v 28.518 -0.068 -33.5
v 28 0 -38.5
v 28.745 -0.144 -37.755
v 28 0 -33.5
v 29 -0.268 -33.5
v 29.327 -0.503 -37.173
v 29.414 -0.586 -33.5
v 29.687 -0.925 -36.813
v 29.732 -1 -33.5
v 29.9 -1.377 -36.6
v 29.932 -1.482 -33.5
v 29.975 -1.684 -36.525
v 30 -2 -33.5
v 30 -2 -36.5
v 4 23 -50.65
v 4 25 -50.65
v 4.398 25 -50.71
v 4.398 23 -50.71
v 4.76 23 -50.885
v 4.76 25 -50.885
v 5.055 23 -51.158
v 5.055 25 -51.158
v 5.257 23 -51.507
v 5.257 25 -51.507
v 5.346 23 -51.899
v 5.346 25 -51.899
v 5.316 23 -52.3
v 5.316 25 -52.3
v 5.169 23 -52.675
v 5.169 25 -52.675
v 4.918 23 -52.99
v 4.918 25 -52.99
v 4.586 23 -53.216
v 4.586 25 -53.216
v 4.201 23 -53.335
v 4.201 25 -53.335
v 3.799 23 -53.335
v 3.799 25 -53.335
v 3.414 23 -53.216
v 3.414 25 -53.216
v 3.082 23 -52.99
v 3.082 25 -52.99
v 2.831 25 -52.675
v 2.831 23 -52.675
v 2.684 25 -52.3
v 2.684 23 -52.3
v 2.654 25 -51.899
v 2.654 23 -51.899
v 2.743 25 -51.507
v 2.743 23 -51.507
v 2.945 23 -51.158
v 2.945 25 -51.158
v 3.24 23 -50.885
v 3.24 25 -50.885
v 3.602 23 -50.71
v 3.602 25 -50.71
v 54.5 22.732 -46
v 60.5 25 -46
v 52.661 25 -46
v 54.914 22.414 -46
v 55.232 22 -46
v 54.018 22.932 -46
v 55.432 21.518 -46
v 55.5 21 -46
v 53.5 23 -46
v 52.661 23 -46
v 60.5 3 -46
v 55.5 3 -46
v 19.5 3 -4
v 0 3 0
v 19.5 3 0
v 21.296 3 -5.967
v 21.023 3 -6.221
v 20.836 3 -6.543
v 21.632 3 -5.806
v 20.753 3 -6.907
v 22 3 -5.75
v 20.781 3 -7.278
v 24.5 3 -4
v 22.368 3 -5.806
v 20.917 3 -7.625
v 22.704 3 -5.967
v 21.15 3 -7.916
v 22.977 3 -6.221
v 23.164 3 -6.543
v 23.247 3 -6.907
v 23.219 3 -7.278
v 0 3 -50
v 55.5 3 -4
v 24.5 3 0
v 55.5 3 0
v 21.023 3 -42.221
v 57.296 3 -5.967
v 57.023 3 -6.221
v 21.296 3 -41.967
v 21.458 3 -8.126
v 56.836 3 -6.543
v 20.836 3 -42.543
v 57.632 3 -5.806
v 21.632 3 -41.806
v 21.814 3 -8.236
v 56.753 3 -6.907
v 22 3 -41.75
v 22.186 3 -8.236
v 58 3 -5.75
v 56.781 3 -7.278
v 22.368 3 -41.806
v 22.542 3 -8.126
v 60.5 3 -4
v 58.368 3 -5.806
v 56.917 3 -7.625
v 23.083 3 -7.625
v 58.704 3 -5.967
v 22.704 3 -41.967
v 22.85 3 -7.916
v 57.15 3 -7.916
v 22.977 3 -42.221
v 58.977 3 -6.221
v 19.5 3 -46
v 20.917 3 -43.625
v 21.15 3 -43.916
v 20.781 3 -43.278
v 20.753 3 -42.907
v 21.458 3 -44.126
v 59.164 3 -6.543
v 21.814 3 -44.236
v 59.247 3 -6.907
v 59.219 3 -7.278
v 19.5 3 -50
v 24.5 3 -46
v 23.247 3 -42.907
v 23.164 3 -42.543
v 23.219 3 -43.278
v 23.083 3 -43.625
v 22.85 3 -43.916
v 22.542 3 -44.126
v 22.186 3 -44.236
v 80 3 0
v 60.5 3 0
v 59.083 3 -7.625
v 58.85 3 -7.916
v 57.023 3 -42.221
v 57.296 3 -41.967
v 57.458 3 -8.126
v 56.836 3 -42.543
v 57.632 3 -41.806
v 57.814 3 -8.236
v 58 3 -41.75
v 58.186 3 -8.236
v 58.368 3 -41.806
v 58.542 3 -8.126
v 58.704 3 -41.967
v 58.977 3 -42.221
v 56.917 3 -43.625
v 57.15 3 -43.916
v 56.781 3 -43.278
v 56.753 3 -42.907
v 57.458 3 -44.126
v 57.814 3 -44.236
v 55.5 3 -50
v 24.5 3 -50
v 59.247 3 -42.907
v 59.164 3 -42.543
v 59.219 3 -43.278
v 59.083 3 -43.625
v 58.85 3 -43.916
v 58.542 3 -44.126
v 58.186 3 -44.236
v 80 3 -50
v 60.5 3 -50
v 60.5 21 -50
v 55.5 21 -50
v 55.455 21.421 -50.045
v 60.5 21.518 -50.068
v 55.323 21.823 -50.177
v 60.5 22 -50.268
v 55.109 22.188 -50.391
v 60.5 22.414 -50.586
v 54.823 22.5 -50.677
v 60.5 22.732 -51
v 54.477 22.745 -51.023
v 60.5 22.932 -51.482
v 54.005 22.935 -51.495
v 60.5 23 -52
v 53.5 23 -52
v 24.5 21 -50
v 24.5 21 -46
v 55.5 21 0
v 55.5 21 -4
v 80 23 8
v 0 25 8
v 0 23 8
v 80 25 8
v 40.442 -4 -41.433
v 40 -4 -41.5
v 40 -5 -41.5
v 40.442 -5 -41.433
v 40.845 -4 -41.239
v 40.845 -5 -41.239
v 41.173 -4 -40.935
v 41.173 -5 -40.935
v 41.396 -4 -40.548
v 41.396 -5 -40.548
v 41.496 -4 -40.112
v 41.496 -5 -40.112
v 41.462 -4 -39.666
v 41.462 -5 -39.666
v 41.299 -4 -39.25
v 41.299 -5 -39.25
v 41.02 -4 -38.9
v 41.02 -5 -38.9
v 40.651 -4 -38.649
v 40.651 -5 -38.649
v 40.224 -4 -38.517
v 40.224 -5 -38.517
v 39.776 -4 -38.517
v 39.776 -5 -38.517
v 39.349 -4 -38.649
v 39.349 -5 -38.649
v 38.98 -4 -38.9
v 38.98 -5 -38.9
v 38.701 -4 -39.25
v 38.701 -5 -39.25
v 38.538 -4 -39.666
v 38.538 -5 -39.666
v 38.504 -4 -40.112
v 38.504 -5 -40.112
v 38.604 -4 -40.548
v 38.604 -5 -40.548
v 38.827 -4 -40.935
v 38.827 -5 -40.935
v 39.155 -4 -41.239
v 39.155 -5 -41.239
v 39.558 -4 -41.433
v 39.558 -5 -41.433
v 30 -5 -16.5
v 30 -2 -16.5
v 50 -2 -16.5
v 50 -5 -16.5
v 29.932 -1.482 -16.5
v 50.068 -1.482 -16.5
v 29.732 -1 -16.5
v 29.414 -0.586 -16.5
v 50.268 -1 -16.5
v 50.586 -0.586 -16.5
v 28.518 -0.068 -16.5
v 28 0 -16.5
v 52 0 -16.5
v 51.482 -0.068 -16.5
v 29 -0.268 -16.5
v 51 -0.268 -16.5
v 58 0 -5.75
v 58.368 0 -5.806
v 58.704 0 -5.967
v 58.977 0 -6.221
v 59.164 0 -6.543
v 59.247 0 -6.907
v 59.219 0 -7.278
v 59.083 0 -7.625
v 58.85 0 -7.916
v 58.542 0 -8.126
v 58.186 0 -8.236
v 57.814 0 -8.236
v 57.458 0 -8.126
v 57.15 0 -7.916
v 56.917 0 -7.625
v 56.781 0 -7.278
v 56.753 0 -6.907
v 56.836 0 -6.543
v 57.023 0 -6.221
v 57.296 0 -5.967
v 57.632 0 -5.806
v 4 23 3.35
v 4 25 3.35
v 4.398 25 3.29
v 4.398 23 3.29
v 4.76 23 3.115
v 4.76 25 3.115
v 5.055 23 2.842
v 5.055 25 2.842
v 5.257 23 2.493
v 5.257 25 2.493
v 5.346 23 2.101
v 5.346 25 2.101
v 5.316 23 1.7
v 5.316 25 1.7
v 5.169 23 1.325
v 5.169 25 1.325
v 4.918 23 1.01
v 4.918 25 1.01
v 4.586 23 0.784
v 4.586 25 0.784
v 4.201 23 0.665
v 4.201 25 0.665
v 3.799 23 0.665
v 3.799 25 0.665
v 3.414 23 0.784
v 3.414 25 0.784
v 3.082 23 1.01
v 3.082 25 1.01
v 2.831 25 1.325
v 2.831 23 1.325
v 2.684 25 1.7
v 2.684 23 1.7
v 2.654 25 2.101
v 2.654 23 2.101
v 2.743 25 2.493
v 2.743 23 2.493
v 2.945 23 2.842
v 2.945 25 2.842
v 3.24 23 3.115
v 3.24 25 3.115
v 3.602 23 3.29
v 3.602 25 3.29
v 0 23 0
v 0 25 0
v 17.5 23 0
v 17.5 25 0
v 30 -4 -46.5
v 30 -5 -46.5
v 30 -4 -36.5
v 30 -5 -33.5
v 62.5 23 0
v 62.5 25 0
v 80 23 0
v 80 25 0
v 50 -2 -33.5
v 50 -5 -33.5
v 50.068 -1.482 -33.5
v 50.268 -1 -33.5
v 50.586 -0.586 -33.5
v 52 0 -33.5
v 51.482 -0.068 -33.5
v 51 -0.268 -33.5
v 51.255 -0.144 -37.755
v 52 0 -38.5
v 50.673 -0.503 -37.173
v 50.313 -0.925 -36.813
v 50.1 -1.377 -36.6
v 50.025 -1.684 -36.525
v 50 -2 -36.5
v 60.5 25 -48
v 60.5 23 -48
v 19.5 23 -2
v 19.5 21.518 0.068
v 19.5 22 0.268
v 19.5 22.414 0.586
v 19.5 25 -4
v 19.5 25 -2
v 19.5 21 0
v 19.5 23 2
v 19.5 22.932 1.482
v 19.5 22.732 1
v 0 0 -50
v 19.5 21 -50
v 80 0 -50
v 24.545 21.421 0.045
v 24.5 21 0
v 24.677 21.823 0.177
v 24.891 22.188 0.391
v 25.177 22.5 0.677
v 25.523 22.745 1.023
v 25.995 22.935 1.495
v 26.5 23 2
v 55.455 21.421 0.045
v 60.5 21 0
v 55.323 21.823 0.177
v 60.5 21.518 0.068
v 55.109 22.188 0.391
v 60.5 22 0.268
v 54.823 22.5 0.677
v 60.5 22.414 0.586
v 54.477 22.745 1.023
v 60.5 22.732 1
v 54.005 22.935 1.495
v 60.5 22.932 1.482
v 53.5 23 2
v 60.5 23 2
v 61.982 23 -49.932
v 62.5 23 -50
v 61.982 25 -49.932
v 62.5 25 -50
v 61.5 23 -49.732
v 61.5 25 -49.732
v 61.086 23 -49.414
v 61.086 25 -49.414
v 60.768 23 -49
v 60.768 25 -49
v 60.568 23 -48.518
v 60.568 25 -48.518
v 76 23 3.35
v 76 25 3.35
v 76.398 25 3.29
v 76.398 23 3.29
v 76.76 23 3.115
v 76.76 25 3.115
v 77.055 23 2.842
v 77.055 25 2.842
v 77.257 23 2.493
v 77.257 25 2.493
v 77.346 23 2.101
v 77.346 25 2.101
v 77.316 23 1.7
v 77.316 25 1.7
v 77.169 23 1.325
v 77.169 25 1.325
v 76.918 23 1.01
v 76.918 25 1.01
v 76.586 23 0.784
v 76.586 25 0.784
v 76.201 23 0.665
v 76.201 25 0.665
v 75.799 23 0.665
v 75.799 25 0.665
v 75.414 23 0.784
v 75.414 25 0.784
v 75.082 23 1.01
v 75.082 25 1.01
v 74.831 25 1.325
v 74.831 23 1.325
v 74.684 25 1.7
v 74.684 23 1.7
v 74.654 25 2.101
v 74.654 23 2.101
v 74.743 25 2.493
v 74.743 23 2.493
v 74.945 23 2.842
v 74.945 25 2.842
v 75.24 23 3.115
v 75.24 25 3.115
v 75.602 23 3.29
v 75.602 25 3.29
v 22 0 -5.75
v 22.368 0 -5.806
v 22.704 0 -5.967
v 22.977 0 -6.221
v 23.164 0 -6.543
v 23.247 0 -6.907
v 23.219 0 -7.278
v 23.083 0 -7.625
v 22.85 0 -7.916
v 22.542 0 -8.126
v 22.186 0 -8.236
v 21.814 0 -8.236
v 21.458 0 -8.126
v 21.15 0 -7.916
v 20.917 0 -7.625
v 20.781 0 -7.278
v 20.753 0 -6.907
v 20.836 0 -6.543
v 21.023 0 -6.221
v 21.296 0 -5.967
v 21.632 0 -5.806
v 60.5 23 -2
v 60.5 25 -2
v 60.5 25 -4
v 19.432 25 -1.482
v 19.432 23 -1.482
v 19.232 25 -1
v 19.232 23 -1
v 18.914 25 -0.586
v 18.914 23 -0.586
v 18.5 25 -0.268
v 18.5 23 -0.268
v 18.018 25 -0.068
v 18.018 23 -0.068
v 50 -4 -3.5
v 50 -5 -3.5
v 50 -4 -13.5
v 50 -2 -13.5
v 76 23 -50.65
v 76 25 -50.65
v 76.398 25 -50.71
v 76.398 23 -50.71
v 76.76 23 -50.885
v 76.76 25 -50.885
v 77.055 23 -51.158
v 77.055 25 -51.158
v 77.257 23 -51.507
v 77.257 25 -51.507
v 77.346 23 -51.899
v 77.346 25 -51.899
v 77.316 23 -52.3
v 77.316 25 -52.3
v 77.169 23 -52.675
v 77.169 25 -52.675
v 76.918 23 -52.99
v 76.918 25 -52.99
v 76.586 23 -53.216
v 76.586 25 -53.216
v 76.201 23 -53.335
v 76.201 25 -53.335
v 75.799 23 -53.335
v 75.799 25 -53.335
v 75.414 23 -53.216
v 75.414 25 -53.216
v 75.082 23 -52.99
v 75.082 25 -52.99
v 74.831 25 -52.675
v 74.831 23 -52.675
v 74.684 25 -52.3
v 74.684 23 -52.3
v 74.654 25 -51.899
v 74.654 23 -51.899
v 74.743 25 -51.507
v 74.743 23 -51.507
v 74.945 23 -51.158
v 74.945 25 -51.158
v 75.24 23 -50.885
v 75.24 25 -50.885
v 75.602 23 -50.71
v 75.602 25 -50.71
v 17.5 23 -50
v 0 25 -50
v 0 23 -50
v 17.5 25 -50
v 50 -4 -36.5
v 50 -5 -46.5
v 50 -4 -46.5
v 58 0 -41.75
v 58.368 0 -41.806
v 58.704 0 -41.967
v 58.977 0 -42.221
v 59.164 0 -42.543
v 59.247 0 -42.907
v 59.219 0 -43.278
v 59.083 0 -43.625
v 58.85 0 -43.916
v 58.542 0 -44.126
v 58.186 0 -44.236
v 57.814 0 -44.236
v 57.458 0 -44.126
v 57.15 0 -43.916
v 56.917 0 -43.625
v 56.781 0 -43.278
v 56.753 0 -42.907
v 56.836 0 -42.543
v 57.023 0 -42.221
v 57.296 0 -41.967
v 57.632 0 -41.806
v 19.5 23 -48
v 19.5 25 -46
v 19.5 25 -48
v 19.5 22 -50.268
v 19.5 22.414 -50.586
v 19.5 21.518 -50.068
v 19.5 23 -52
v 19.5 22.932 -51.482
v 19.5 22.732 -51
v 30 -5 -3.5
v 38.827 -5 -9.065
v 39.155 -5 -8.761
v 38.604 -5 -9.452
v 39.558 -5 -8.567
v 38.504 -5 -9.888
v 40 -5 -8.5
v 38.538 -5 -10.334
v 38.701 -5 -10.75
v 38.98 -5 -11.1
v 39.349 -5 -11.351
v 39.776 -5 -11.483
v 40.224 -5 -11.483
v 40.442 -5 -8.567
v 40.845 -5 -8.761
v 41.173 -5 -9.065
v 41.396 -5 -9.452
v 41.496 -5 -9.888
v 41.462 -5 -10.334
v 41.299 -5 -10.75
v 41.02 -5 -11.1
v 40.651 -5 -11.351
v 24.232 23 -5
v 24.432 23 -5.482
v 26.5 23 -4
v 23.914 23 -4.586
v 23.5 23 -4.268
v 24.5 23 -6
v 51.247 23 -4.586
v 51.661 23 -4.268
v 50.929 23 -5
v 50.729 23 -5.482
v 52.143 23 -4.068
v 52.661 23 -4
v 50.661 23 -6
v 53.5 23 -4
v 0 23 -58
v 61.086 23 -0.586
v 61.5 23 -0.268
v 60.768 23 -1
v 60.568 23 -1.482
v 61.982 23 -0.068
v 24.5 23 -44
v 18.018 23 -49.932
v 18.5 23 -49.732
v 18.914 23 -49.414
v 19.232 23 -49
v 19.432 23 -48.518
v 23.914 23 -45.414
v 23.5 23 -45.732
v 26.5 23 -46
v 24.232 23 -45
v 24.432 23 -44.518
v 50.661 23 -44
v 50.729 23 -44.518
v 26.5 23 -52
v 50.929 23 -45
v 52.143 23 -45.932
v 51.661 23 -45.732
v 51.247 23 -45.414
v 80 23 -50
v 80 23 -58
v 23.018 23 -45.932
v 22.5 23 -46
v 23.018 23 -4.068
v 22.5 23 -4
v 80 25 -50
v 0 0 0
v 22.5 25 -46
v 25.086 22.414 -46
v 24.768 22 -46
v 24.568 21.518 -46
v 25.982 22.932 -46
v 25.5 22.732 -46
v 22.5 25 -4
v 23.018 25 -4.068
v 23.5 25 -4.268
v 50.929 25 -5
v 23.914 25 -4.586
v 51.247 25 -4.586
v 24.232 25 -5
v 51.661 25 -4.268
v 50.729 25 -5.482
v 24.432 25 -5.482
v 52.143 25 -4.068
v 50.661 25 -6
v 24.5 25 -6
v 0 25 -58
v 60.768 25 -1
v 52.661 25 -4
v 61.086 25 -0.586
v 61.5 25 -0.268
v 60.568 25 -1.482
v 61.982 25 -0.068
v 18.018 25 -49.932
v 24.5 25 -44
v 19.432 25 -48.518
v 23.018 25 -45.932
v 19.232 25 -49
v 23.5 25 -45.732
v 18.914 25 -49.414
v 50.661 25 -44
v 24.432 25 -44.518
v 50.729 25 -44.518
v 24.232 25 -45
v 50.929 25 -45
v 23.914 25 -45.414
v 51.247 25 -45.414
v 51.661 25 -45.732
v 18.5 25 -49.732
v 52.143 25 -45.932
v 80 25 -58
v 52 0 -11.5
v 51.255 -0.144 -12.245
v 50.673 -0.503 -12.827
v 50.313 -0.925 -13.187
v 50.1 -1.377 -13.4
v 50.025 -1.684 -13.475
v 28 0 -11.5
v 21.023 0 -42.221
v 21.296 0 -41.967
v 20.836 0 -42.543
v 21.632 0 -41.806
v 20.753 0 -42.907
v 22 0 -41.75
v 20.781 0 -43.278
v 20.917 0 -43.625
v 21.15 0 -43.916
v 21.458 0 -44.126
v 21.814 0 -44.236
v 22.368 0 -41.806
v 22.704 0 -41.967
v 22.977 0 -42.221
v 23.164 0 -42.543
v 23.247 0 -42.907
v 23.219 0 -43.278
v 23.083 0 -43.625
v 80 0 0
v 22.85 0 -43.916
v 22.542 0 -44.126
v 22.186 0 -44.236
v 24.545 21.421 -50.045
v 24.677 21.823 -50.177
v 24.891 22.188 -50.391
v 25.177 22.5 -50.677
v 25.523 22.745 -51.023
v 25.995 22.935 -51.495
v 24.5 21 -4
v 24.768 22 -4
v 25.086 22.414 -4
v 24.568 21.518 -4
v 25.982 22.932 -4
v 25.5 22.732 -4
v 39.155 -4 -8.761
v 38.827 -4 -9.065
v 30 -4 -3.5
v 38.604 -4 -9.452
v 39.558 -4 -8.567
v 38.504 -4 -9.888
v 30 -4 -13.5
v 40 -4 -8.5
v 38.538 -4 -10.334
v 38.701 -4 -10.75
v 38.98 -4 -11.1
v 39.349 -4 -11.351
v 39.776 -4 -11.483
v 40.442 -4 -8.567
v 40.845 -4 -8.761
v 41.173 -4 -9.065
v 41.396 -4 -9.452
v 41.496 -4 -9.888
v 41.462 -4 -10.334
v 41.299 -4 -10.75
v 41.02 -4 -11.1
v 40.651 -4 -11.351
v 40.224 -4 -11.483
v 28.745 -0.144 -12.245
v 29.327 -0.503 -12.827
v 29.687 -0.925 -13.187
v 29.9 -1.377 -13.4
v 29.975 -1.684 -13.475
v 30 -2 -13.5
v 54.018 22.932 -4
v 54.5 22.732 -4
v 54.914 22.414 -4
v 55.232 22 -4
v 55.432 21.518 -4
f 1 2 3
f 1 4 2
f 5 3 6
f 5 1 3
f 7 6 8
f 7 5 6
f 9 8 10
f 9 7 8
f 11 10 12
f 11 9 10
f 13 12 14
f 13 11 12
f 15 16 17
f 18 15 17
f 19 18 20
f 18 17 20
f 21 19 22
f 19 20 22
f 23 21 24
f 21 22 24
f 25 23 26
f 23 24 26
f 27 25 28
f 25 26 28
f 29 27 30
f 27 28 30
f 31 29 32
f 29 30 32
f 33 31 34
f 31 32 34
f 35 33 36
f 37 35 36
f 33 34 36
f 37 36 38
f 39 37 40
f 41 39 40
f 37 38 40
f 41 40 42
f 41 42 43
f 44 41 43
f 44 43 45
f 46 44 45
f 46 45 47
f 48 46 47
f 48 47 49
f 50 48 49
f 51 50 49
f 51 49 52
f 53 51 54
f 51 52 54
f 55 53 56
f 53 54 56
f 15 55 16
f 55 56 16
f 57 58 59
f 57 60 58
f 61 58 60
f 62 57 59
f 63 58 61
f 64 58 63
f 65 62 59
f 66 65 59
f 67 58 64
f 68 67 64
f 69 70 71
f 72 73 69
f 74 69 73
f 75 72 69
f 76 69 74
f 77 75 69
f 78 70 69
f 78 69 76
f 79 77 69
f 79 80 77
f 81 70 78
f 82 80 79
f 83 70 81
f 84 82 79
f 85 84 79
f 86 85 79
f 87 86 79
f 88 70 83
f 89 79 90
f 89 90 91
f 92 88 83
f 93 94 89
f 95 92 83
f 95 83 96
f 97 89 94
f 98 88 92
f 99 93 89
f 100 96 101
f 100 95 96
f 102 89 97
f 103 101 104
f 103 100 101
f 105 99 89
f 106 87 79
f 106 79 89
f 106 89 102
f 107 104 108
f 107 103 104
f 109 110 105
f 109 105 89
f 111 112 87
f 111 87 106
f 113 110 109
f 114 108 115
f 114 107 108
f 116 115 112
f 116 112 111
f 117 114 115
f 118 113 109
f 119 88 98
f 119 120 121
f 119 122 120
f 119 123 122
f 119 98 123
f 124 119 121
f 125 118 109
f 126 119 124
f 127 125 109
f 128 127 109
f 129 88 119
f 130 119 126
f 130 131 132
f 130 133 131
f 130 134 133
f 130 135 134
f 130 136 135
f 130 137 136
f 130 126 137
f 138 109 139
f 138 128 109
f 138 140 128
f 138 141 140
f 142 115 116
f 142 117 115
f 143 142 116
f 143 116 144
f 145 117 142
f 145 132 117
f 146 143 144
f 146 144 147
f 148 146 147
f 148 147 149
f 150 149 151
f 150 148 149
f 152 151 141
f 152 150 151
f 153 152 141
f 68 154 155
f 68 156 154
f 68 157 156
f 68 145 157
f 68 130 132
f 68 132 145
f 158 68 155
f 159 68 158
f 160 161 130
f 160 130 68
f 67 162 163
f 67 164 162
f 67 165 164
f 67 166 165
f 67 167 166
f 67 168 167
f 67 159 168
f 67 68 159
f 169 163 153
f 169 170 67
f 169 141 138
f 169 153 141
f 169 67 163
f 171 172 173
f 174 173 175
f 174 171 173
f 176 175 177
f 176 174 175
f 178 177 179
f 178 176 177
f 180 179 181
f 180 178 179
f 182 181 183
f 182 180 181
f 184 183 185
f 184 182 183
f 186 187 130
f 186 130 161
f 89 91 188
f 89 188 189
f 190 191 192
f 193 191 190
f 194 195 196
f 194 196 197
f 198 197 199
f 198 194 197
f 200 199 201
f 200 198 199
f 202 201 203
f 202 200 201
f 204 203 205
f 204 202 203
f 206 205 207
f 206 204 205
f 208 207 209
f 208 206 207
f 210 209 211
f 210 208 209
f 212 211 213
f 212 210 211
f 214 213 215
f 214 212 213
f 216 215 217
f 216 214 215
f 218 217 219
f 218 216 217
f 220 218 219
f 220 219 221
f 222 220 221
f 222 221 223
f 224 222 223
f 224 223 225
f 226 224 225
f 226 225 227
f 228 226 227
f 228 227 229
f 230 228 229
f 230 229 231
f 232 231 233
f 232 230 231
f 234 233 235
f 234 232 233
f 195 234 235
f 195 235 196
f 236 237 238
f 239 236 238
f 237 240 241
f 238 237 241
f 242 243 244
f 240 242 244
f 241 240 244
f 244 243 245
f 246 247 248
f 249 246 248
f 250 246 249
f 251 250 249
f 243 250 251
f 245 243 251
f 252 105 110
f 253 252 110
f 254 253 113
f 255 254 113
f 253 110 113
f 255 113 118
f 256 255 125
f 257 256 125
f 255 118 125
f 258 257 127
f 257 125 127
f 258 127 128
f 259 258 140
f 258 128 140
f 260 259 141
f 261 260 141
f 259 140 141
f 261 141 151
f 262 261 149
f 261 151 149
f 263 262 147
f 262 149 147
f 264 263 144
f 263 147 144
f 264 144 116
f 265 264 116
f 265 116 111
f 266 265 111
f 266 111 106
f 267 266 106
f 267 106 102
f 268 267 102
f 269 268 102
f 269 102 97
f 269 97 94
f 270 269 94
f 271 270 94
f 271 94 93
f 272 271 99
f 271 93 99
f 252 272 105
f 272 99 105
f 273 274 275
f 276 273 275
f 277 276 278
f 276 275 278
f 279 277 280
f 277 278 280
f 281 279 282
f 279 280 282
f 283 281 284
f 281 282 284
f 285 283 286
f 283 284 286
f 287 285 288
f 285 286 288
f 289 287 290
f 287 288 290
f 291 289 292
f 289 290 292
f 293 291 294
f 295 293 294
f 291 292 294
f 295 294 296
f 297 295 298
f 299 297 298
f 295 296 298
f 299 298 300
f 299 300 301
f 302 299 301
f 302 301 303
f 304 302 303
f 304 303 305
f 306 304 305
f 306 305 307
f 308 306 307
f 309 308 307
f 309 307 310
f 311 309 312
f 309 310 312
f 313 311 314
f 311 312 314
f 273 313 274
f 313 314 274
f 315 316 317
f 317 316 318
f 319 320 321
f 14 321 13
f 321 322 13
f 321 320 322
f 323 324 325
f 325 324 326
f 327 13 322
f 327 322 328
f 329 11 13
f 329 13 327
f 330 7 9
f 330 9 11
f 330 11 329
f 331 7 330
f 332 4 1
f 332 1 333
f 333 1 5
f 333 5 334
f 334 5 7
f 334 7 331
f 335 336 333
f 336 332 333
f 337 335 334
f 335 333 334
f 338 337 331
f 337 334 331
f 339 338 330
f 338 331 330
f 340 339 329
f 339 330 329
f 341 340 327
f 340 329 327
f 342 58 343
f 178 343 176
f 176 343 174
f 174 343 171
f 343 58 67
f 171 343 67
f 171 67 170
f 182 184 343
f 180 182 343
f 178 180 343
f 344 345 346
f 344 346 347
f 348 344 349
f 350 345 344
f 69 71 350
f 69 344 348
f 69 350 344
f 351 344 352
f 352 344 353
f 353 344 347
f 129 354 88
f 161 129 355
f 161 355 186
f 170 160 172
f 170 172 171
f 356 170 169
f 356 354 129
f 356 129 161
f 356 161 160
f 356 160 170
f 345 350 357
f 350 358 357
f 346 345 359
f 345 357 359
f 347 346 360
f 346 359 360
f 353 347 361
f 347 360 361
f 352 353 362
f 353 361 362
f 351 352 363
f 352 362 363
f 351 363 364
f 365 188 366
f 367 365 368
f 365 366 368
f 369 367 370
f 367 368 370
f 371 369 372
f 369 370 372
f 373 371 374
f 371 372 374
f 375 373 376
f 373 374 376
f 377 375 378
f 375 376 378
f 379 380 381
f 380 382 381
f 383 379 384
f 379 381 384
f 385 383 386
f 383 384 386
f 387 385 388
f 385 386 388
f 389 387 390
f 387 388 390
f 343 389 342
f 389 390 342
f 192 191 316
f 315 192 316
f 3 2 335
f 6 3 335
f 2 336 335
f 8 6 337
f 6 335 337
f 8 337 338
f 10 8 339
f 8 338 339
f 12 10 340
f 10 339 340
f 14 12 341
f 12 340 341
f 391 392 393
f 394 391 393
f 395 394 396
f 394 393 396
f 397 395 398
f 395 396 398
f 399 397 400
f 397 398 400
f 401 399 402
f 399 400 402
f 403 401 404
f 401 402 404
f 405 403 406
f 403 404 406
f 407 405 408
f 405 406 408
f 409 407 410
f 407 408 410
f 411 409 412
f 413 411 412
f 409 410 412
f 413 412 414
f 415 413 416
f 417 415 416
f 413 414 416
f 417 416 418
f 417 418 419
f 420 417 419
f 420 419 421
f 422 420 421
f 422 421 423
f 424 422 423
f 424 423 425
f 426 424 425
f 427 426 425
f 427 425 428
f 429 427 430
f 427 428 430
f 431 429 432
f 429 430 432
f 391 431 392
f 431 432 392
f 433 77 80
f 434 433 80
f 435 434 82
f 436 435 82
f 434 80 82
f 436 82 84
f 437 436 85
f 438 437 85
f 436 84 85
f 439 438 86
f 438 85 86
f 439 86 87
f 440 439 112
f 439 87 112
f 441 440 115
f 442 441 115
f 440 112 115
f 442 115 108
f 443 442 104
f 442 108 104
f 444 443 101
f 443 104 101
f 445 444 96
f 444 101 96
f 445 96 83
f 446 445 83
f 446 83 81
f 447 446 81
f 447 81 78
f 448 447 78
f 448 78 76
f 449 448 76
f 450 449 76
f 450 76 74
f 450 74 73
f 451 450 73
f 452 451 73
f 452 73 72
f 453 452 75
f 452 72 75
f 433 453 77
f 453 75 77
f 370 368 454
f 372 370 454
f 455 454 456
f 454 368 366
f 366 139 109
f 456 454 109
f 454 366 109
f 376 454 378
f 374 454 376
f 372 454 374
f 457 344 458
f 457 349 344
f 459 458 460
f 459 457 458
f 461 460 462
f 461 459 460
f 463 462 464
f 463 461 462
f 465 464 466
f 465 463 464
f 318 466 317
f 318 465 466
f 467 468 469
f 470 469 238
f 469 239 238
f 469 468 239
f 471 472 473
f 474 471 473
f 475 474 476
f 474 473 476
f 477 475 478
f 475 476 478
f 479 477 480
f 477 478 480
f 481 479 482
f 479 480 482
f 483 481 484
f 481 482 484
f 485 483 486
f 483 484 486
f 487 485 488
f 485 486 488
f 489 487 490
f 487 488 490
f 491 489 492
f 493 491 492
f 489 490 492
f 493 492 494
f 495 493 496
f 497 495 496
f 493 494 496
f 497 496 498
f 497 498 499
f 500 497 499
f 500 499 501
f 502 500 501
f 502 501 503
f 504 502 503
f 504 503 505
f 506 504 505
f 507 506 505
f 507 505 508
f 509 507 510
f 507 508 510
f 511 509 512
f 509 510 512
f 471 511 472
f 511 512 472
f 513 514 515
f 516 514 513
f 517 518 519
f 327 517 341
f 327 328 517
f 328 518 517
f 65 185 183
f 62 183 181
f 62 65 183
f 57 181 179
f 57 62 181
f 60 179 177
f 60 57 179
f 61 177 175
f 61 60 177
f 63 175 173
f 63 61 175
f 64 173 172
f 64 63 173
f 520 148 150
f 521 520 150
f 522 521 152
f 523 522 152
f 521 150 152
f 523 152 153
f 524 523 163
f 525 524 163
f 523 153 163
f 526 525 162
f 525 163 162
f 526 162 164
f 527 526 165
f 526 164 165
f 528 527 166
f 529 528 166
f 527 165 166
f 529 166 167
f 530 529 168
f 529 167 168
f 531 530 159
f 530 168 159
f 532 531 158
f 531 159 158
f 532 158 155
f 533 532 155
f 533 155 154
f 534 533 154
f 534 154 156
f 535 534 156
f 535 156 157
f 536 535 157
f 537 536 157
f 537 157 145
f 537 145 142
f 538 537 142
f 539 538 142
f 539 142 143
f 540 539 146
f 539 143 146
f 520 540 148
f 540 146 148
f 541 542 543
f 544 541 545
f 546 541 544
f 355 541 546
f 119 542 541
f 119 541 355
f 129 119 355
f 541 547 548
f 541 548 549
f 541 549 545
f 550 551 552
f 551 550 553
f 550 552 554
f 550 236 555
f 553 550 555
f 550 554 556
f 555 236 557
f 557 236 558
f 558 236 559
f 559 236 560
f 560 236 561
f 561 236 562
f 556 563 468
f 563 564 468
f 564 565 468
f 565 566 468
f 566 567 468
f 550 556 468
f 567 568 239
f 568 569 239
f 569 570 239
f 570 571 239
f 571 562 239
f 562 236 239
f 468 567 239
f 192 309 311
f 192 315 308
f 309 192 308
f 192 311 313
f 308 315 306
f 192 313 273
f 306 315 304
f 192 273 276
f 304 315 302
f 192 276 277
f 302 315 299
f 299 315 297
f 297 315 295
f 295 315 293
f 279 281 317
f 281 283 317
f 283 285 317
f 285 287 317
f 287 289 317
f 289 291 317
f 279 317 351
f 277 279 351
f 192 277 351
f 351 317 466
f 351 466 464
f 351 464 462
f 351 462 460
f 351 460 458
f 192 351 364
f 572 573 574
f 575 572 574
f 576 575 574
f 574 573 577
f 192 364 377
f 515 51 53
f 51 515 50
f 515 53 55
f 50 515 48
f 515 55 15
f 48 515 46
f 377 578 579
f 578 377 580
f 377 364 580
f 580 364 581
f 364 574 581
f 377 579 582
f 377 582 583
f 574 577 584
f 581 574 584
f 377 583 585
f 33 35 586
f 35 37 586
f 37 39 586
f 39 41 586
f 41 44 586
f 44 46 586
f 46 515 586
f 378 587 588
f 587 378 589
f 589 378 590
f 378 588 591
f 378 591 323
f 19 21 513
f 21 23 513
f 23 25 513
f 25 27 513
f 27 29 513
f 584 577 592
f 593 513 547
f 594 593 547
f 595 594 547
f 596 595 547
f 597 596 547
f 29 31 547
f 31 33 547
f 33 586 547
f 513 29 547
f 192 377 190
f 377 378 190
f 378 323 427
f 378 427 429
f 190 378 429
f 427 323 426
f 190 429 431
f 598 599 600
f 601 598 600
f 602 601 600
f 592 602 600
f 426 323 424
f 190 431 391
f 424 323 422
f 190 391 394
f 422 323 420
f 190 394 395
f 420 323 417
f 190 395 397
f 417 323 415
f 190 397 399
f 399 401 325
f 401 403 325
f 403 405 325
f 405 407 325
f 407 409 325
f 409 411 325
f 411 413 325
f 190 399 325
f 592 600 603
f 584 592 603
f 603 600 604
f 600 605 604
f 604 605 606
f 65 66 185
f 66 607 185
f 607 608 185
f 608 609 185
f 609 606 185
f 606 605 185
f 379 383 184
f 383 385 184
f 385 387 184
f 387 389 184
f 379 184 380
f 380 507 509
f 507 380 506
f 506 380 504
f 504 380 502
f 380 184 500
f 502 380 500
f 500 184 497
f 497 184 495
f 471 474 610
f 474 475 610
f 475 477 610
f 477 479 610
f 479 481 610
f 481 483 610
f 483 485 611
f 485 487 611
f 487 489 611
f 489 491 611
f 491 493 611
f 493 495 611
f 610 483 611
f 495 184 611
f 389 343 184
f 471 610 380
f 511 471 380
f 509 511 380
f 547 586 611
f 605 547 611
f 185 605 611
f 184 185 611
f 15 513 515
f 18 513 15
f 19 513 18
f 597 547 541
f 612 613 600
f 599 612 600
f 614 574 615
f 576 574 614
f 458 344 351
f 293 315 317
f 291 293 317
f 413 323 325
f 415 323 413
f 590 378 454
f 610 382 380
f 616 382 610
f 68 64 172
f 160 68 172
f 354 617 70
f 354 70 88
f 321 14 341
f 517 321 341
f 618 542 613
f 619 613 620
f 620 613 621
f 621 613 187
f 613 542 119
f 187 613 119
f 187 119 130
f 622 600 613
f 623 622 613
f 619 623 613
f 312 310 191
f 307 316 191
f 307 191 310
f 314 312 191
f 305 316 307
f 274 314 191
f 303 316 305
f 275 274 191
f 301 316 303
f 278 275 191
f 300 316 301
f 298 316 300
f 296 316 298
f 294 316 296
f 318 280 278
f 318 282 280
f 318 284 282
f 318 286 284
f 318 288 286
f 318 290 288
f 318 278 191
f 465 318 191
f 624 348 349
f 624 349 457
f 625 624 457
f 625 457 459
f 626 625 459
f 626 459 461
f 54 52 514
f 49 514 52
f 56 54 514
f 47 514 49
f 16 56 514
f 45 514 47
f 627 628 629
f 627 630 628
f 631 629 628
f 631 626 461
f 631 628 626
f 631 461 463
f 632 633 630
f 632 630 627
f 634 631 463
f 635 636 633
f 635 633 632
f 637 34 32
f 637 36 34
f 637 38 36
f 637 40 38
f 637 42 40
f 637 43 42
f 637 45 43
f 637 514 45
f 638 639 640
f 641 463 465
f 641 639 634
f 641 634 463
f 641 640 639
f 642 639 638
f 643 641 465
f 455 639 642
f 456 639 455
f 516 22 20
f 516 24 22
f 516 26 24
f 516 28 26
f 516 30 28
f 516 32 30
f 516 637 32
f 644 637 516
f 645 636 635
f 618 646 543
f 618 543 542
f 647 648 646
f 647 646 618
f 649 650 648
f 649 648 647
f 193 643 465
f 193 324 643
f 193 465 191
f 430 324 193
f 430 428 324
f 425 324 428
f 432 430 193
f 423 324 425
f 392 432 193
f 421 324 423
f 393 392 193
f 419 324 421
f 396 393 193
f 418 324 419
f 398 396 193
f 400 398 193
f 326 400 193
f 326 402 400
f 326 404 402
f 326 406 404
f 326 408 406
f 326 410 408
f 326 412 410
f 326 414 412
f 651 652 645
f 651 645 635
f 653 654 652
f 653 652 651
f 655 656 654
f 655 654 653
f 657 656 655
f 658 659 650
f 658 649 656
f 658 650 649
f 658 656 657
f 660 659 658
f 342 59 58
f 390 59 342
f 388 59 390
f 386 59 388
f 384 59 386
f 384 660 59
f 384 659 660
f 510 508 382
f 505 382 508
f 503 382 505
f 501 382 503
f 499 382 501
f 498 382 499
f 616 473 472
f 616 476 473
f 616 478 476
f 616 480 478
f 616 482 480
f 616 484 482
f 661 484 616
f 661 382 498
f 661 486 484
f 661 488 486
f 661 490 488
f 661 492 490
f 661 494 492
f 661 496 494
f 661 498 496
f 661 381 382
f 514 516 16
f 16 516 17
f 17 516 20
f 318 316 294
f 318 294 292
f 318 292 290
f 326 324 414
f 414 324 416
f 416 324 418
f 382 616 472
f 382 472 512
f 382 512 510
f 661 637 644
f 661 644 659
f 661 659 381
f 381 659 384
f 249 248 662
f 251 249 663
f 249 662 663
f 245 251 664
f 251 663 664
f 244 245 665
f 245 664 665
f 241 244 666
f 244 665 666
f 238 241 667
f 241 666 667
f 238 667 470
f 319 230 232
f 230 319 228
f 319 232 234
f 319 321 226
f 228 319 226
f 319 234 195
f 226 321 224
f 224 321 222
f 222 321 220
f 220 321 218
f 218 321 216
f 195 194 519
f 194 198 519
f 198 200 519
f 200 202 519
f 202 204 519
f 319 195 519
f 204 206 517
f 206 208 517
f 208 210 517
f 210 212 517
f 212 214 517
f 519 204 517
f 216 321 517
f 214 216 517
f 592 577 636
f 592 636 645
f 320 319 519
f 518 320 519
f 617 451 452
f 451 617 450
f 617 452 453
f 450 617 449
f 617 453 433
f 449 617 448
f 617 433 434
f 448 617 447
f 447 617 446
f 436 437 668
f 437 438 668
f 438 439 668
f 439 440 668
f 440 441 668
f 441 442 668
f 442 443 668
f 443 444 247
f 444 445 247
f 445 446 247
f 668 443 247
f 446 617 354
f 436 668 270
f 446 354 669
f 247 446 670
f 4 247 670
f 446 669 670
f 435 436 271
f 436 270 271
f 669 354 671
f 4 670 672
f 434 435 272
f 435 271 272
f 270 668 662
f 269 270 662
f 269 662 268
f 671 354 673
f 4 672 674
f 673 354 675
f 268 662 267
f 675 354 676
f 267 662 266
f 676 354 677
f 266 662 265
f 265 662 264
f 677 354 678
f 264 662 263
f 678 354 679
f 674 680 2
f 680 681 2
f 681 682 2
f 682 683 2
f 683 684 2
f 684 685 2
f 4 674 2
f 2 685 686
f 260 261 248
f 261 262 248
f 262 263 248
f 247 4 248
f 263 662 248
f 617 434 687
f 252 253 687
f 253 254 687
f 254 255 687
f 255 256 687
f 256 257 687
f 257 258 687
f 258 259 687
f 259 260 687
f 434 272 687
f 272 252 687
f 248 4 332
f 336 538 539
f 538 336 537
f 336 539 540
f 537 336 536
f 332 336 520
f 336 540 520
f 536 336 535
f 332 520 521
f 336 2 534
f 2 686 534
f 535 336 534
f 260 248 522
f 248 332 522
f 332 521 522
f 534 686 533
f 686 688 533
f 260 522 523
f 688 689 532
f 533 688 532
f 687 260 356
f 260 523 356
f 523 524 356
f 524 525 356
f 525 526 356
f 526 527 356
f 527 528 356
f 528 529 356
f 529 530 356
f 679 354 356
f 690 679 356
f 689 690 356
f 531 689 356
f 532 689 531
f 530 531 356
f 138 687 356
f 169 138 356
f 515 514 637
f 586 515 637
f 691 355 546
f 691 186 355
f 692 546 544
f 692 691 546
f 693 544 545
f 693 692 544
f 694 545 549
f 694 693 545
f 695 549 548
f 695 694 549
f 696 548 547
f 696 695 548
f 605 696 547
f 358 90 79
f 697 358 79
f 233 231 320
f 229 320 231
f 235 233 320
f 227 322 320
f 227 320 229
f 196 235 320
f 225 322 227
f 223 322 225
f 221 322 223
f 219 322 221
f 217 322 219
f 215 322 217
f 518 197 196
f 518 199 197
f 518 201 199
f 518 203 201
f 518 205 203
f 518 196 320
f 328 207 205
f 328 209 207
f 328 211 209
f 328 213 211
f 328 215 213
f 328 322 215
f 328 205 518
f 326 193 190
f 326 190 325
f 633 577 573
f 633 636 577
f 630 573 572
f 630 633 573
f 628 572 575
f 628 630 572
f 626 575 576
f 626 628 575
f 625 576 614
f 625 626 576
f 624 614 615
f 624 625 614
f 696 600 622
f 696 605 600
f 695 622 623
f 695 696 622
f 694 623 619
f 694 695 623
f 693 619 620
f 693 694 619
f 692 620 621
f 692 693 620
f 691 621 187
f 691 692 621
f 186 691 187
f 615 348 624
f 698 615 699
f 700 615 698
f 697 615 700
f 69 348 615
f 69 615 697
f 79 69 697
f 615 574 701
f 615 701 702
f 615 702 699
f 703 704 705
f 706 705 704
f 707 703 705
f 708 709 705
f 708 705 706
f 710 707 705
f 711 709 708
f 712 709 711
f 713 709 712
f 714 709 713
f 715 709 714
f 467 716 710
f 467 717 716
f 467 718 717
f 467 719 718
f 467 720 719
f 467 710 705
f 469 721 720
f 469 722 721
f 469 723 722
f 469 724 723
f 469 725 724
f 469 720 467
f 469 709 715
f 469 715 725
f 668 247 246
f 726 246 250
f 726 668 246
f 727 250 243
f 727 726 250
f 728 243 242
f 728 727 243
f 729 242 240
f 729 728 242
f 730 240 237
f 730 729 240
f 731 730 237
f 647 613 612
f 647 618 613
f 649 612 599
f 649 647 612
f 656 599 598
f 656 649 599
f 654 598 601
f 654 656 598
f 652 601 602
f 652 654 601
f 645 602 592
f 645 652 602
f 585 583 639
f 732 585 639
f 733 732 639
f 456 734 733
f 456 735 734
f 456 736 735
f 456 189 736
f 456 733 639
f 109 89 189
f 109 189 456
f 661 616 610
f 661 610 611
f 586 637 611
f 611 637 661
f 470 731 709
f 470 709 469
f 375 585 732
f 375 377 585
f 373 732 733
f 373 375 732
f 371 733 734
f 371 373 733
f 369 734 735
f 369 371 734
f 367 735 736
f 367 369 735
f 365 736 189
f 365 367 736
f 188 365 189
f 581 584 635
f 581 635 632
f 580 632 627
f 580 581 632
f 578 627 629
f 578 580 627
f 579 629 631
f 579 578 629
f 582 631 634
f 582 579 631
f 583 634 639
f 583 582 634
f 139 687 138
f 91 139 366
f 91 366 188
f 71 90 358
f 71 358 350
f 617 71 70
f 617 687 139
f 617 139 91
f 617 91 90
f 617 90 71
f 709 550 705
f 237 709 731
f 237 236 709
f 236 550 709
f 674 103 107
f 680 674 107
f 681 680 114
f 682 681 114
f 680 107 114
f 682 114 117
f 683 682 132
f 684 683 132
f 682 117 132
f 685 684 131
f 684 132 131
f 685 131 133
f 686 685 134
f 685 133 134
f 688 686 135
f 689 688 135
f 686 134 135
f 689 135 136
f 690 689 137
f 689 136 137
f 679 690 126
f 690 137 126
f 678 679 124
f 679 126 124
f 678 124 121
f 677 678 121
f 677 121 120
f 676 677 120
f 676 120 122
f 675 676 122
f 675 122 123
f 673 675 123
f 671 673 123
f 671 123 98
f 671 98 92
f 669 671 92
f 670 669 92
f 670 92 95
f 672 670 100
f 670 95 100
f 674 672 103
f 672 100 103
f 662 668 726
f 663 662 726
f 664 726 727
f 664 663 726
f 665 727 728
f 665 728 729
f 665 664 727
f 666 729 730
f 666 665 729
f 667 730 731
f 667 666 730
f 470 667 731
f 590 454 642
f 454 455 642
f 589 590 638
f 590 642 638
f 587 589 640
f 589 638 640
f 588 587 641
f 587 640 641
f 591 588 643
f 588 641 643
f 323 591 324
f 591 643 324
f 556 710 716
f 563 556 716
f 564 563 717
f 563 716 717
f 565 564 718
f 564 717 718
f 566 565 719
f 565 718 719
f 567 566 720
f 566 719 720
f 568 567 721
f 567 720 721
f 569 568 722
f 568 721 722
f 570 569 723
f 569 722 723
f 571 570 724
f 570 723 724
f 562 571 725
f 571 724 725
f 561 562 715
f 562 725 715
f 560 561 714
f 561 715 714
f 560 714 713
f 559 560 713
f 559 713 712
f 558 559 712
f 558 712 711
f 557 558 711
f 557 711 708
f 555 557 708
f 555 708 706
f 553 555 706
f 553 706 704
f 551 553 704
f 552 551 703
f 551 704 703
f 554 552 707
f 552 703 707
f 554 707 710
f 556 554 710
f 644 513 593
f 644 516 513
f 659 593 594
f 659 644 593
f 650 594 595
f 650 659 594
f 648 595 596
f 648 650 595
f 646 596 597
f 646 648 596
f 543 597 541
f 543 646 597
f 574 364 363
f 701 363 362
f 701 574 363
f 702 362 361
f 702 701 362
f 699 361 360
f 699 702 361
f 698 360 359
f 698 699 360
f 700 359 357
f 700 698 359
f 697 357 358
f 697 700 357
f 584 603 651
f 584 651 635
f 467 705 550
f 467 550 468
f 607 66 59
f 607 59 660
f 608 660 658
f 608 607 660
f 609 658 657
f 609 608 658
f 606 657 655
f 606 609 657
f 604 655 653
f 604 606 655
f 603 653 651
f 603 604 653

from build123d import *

# Parameters (mm, degrees)
SKETCH1_W           = 80
SKETCH1_H           = 50
BOSS_EXTRUDE1_DEPTH = 3
SKETCH2_R           = 1.25
CUT_EXTRUDE1_DEPTH  = 3
SKETCH3_W           = 5
SKETCH3_H           = 4
BOSS_EXTRUDE2_DEPTH = 22
BOSS_EXTRUDE3_DEPTH = 2
FILLET1_R           = 2
SKETCH8_W           = 80
SKETCH8_H           = 8
BOSS_EXTRUDE4_DEPTH = 2
FILLET2_R           = 2
SKETCH6_R           = 1.35
CUT_EXTRUDE2_DEPTH  = 2
SKETCH12_W          = 20
SKETCH12_H          = 3
BOSS_EXTRUDE6_DEPTH = 5
SKETCH13_W          = 20
SKETCH13_H          = 1
BOSS_EXTRUDE7_DEPTH = 10
SKETCH14_R          = 1.5
CUT_EXTRUDE5_DEPTH  = 1
FILLET3_R           = 2
FILLET4_R           = 2


with BuildPart() as part:
    # Sketch1 → Boss-Extrude1 (new body)
    with BuildSketch(Plane(origin=(0, 0, 0), x_dir=(1, 0, 0), z_dir=(0, 1, 0))):
        with Locations((40, 25)):
            Rectangle(SKETCH1_W, SKETCH1_H)
    extrude(amount=BOSS_EXTRUDE1_DEPTH)

    # Sketch2 → Cut-Extrude1 (cut)
    with BuildSketch(Plane(origin=(0, 3, 0), x_dir=(1, 0, 0), z_dir=(0, 1, 0))):
        with Locations(Location((22, 43, 0), (0, 0, 270))):
            Circle(SKETCH2_R)
        with Locations(Location((58, 43, 0), (0, 0, 270))):
            Circle(SKETCH2_R)
        with Locations(Location((22, 7, 0), (0, 0, 270))):
            Circle(SKETCH2_R)
        with Locations(Location((58, 7, 0), (0, 0, 270))):
            Circle(SKETCH2_R)
    extrude(amount=-CUT_EXTRUDE1_DEPTH, mode=Mode.SUBTRACT)

    # Sketch3 → Boss-Extrude2 (add)
    with BuildSketch(Plane(origin=(0, 3, 0), x_dir=(1, 0, 0), z_dir=(0, 1, 0))):
        with Locations((22, 2)):
            Rectangle(SKETCH3_W, SKETCH3_H)
        with Locations((22, 48)):
            Rectangle(SKETCH3_W, SKETCH3_H)
        with Locations((58, 48)):
            Rectangle(SKETCH3_W, SKETCH3_H)
        with Locations((58, 2)):
            Rectangle(SKETCH3_W, SKETCH3_H)
    extrude(amount=BOSS_EXTRUDE2_DEPTH)

    # Sketch5 → Boss-Extrude3 (add)
    with BuildSketch(Plane(origin=(0, 23, 0), x_dir=(1, 0, 0), z_dir=(0, 1, 0))):
        with BuildLine():
            Line((24.5, 50), (55.5, 50))
            Line((55.5, 50), (55.5, 46))
            Line((55.5, 46), (52.660903874, 46))
            ThreePointArc((52.660903874, 46), (51.246690312, 45.414213562), (50.660903874, 44))
            Line((50.660903874, 44), (50.660903874, 6))
            ThreePointArc((50.660903874, 6), (51.246690312, 4.585786438), (52.660903874, 4))
            Line((52.660903874, 4), (55.5, 4))
            Line((55.5, 4), (55.5, 0))
            Line((55.5, 0), (24.5, 0))
            Line((24.5, 0), (24.5, 4))
            Line((24.5, 4), (24.5, 46))
            Line((24.5, 46), (24.5, 50))
        make_face()
    extrude(amount=BOSS_EXTRUDE3_DEPTH)

    # Fillet1
    fillet1_edges = [part.edges().sort_by_distance(p)[0] for p in [
        (24.5, 24, -4),
        (24.5, 24, -46),
    ]]
    fillet(fillet1_edges, radius=FILLET1_R)

    # Sketch8 → Boss-Extrude4 (add)
    with BuildSketch(Plane(origin=(0, 25, 0), x_dir=(1, 0, 0), z_dir=(0, 1, 0))):
        with Locations((40, 54)):
            Rectangle(SKETCH8_W, SKETCH8_H)
        with Locations((40, -4)):
            Rectangle(SKETCH8_W, SKETCH8_H)
    extrude(amount=-BOSS_EXTRUDE4_DEPTH)

    # Fillet2
    fillet2_edges = [part.edges().sort_by_distance(p)[0] for p in [
        (19.5, 24, 0),
        (60.5, 24, 0),
        (60.5, 24, -50),
        (19.5, 24, -50),
    ]]
    fillet(fillet2_edges, radius=FILLET2_R)

    # Sketch6 → Cut-Extrude2 (cut)
    with BuildSketch(Plane(origin=(0, 25, 0), x_dir=(1, 0, 0), z_dir=(0, 1, 0))):
        with Locations(Location((4, -2, 0), (0, 0, 270))):
            Circle(SKETCH6_R)
        with Locations(Location((4, 52, 0), (0, 0, 270))):
            Circle(SKETCH6_R)
        with Locations(Location((76, 52, 0), (0, 0, 270))):
            Circle(SKETCH6_R)
        with Locations(Location((76, -2, 0), (0, 0, 270))):
            Circle(SKETCH6_R)
    extrude(amount=-CUT_EXTRUDE2_DEPTH, mode=Mode.SUBTRACT)

    # Sketch12 → Boss-Extrude6 (add)
    with BuildSketch(Plane.XZ):
        with Locations((40, -15)):
            Rectangle(SKETCH12_W, SKETCH12_H)
        with Locations((40, -35)):
            Rectangle(SKETCH12_W, SKETCH12_H)
    extrude(amount=BOSS_EXTRUDE6_DEPTH)

    # Sketch13 → Boss-Extrude7 (add)
    with BuildSketch(Plane.XY.offset(-13.5)):
        with Locations((40, -4.5)):
            Rectangle(SKETCH13_W, SKETCH13_H)
    boss_extrude7 = extrude(amount=BOSS_EXTRUDE7_DEPTH)

    # Sketch14 → Cut-Extrude5 (cut)
    with BuildSketch(Plane(origin=(0, -4, 0), x_dir=(1, 0, 0), z_dir=(0, 1, 0))):
        with Locations(Location((40, 10, 0), (0, 0, 270))):
            Circle(SKETCH14_R)
    cut_extrude5 = extrude(amount=-CUT_EXTRUDE5_DEPTH, mode=Mode.SUBTRACT)

    # Mirror1: Boss-Extrude7, Cut-Extrude5 across plane
    add(boss_extrude7.mirror(Plane(origin=(0, 0, -25), x_dir=(1, 0, 0), z_dir=(0, 0, -1))))
    add(cut_extrude5.mirror(Plane(origin=(0, 0, -25), x_dir=(1, 0, 0), z_dir=(0, 0, -1))), mode=Mode.SUBTRACT)

    # Fillet3
    fillet3_edges = [part.edges().sort_by_distance(p)[0] for p in [
        (58, 23, -50),
        (22, 23, -50),
        (22, 23, 0),
        (58, 23, 0),
        (24.5, 23, -2),
        (24.5, 23, -48),
        (55.5, 23, -2),
        (55.5, 23, -48),
    ]]
    fillet(fillet3_edges, radius=FILLET3_R)

    # Fillet4
    fillet4_edges = [part.edges().sort_by_distance(p)[0] for p in [
        (30, 0, -35),
        (40, 0, -36.5),
        (50, 0, -35),
        (50, 0, -15),
        (40, 0, -13.5),
        (30, 0, -15),
    ]]
    fillet(fillet4_edges, radius=FILLET4_R)


solid = part.part
